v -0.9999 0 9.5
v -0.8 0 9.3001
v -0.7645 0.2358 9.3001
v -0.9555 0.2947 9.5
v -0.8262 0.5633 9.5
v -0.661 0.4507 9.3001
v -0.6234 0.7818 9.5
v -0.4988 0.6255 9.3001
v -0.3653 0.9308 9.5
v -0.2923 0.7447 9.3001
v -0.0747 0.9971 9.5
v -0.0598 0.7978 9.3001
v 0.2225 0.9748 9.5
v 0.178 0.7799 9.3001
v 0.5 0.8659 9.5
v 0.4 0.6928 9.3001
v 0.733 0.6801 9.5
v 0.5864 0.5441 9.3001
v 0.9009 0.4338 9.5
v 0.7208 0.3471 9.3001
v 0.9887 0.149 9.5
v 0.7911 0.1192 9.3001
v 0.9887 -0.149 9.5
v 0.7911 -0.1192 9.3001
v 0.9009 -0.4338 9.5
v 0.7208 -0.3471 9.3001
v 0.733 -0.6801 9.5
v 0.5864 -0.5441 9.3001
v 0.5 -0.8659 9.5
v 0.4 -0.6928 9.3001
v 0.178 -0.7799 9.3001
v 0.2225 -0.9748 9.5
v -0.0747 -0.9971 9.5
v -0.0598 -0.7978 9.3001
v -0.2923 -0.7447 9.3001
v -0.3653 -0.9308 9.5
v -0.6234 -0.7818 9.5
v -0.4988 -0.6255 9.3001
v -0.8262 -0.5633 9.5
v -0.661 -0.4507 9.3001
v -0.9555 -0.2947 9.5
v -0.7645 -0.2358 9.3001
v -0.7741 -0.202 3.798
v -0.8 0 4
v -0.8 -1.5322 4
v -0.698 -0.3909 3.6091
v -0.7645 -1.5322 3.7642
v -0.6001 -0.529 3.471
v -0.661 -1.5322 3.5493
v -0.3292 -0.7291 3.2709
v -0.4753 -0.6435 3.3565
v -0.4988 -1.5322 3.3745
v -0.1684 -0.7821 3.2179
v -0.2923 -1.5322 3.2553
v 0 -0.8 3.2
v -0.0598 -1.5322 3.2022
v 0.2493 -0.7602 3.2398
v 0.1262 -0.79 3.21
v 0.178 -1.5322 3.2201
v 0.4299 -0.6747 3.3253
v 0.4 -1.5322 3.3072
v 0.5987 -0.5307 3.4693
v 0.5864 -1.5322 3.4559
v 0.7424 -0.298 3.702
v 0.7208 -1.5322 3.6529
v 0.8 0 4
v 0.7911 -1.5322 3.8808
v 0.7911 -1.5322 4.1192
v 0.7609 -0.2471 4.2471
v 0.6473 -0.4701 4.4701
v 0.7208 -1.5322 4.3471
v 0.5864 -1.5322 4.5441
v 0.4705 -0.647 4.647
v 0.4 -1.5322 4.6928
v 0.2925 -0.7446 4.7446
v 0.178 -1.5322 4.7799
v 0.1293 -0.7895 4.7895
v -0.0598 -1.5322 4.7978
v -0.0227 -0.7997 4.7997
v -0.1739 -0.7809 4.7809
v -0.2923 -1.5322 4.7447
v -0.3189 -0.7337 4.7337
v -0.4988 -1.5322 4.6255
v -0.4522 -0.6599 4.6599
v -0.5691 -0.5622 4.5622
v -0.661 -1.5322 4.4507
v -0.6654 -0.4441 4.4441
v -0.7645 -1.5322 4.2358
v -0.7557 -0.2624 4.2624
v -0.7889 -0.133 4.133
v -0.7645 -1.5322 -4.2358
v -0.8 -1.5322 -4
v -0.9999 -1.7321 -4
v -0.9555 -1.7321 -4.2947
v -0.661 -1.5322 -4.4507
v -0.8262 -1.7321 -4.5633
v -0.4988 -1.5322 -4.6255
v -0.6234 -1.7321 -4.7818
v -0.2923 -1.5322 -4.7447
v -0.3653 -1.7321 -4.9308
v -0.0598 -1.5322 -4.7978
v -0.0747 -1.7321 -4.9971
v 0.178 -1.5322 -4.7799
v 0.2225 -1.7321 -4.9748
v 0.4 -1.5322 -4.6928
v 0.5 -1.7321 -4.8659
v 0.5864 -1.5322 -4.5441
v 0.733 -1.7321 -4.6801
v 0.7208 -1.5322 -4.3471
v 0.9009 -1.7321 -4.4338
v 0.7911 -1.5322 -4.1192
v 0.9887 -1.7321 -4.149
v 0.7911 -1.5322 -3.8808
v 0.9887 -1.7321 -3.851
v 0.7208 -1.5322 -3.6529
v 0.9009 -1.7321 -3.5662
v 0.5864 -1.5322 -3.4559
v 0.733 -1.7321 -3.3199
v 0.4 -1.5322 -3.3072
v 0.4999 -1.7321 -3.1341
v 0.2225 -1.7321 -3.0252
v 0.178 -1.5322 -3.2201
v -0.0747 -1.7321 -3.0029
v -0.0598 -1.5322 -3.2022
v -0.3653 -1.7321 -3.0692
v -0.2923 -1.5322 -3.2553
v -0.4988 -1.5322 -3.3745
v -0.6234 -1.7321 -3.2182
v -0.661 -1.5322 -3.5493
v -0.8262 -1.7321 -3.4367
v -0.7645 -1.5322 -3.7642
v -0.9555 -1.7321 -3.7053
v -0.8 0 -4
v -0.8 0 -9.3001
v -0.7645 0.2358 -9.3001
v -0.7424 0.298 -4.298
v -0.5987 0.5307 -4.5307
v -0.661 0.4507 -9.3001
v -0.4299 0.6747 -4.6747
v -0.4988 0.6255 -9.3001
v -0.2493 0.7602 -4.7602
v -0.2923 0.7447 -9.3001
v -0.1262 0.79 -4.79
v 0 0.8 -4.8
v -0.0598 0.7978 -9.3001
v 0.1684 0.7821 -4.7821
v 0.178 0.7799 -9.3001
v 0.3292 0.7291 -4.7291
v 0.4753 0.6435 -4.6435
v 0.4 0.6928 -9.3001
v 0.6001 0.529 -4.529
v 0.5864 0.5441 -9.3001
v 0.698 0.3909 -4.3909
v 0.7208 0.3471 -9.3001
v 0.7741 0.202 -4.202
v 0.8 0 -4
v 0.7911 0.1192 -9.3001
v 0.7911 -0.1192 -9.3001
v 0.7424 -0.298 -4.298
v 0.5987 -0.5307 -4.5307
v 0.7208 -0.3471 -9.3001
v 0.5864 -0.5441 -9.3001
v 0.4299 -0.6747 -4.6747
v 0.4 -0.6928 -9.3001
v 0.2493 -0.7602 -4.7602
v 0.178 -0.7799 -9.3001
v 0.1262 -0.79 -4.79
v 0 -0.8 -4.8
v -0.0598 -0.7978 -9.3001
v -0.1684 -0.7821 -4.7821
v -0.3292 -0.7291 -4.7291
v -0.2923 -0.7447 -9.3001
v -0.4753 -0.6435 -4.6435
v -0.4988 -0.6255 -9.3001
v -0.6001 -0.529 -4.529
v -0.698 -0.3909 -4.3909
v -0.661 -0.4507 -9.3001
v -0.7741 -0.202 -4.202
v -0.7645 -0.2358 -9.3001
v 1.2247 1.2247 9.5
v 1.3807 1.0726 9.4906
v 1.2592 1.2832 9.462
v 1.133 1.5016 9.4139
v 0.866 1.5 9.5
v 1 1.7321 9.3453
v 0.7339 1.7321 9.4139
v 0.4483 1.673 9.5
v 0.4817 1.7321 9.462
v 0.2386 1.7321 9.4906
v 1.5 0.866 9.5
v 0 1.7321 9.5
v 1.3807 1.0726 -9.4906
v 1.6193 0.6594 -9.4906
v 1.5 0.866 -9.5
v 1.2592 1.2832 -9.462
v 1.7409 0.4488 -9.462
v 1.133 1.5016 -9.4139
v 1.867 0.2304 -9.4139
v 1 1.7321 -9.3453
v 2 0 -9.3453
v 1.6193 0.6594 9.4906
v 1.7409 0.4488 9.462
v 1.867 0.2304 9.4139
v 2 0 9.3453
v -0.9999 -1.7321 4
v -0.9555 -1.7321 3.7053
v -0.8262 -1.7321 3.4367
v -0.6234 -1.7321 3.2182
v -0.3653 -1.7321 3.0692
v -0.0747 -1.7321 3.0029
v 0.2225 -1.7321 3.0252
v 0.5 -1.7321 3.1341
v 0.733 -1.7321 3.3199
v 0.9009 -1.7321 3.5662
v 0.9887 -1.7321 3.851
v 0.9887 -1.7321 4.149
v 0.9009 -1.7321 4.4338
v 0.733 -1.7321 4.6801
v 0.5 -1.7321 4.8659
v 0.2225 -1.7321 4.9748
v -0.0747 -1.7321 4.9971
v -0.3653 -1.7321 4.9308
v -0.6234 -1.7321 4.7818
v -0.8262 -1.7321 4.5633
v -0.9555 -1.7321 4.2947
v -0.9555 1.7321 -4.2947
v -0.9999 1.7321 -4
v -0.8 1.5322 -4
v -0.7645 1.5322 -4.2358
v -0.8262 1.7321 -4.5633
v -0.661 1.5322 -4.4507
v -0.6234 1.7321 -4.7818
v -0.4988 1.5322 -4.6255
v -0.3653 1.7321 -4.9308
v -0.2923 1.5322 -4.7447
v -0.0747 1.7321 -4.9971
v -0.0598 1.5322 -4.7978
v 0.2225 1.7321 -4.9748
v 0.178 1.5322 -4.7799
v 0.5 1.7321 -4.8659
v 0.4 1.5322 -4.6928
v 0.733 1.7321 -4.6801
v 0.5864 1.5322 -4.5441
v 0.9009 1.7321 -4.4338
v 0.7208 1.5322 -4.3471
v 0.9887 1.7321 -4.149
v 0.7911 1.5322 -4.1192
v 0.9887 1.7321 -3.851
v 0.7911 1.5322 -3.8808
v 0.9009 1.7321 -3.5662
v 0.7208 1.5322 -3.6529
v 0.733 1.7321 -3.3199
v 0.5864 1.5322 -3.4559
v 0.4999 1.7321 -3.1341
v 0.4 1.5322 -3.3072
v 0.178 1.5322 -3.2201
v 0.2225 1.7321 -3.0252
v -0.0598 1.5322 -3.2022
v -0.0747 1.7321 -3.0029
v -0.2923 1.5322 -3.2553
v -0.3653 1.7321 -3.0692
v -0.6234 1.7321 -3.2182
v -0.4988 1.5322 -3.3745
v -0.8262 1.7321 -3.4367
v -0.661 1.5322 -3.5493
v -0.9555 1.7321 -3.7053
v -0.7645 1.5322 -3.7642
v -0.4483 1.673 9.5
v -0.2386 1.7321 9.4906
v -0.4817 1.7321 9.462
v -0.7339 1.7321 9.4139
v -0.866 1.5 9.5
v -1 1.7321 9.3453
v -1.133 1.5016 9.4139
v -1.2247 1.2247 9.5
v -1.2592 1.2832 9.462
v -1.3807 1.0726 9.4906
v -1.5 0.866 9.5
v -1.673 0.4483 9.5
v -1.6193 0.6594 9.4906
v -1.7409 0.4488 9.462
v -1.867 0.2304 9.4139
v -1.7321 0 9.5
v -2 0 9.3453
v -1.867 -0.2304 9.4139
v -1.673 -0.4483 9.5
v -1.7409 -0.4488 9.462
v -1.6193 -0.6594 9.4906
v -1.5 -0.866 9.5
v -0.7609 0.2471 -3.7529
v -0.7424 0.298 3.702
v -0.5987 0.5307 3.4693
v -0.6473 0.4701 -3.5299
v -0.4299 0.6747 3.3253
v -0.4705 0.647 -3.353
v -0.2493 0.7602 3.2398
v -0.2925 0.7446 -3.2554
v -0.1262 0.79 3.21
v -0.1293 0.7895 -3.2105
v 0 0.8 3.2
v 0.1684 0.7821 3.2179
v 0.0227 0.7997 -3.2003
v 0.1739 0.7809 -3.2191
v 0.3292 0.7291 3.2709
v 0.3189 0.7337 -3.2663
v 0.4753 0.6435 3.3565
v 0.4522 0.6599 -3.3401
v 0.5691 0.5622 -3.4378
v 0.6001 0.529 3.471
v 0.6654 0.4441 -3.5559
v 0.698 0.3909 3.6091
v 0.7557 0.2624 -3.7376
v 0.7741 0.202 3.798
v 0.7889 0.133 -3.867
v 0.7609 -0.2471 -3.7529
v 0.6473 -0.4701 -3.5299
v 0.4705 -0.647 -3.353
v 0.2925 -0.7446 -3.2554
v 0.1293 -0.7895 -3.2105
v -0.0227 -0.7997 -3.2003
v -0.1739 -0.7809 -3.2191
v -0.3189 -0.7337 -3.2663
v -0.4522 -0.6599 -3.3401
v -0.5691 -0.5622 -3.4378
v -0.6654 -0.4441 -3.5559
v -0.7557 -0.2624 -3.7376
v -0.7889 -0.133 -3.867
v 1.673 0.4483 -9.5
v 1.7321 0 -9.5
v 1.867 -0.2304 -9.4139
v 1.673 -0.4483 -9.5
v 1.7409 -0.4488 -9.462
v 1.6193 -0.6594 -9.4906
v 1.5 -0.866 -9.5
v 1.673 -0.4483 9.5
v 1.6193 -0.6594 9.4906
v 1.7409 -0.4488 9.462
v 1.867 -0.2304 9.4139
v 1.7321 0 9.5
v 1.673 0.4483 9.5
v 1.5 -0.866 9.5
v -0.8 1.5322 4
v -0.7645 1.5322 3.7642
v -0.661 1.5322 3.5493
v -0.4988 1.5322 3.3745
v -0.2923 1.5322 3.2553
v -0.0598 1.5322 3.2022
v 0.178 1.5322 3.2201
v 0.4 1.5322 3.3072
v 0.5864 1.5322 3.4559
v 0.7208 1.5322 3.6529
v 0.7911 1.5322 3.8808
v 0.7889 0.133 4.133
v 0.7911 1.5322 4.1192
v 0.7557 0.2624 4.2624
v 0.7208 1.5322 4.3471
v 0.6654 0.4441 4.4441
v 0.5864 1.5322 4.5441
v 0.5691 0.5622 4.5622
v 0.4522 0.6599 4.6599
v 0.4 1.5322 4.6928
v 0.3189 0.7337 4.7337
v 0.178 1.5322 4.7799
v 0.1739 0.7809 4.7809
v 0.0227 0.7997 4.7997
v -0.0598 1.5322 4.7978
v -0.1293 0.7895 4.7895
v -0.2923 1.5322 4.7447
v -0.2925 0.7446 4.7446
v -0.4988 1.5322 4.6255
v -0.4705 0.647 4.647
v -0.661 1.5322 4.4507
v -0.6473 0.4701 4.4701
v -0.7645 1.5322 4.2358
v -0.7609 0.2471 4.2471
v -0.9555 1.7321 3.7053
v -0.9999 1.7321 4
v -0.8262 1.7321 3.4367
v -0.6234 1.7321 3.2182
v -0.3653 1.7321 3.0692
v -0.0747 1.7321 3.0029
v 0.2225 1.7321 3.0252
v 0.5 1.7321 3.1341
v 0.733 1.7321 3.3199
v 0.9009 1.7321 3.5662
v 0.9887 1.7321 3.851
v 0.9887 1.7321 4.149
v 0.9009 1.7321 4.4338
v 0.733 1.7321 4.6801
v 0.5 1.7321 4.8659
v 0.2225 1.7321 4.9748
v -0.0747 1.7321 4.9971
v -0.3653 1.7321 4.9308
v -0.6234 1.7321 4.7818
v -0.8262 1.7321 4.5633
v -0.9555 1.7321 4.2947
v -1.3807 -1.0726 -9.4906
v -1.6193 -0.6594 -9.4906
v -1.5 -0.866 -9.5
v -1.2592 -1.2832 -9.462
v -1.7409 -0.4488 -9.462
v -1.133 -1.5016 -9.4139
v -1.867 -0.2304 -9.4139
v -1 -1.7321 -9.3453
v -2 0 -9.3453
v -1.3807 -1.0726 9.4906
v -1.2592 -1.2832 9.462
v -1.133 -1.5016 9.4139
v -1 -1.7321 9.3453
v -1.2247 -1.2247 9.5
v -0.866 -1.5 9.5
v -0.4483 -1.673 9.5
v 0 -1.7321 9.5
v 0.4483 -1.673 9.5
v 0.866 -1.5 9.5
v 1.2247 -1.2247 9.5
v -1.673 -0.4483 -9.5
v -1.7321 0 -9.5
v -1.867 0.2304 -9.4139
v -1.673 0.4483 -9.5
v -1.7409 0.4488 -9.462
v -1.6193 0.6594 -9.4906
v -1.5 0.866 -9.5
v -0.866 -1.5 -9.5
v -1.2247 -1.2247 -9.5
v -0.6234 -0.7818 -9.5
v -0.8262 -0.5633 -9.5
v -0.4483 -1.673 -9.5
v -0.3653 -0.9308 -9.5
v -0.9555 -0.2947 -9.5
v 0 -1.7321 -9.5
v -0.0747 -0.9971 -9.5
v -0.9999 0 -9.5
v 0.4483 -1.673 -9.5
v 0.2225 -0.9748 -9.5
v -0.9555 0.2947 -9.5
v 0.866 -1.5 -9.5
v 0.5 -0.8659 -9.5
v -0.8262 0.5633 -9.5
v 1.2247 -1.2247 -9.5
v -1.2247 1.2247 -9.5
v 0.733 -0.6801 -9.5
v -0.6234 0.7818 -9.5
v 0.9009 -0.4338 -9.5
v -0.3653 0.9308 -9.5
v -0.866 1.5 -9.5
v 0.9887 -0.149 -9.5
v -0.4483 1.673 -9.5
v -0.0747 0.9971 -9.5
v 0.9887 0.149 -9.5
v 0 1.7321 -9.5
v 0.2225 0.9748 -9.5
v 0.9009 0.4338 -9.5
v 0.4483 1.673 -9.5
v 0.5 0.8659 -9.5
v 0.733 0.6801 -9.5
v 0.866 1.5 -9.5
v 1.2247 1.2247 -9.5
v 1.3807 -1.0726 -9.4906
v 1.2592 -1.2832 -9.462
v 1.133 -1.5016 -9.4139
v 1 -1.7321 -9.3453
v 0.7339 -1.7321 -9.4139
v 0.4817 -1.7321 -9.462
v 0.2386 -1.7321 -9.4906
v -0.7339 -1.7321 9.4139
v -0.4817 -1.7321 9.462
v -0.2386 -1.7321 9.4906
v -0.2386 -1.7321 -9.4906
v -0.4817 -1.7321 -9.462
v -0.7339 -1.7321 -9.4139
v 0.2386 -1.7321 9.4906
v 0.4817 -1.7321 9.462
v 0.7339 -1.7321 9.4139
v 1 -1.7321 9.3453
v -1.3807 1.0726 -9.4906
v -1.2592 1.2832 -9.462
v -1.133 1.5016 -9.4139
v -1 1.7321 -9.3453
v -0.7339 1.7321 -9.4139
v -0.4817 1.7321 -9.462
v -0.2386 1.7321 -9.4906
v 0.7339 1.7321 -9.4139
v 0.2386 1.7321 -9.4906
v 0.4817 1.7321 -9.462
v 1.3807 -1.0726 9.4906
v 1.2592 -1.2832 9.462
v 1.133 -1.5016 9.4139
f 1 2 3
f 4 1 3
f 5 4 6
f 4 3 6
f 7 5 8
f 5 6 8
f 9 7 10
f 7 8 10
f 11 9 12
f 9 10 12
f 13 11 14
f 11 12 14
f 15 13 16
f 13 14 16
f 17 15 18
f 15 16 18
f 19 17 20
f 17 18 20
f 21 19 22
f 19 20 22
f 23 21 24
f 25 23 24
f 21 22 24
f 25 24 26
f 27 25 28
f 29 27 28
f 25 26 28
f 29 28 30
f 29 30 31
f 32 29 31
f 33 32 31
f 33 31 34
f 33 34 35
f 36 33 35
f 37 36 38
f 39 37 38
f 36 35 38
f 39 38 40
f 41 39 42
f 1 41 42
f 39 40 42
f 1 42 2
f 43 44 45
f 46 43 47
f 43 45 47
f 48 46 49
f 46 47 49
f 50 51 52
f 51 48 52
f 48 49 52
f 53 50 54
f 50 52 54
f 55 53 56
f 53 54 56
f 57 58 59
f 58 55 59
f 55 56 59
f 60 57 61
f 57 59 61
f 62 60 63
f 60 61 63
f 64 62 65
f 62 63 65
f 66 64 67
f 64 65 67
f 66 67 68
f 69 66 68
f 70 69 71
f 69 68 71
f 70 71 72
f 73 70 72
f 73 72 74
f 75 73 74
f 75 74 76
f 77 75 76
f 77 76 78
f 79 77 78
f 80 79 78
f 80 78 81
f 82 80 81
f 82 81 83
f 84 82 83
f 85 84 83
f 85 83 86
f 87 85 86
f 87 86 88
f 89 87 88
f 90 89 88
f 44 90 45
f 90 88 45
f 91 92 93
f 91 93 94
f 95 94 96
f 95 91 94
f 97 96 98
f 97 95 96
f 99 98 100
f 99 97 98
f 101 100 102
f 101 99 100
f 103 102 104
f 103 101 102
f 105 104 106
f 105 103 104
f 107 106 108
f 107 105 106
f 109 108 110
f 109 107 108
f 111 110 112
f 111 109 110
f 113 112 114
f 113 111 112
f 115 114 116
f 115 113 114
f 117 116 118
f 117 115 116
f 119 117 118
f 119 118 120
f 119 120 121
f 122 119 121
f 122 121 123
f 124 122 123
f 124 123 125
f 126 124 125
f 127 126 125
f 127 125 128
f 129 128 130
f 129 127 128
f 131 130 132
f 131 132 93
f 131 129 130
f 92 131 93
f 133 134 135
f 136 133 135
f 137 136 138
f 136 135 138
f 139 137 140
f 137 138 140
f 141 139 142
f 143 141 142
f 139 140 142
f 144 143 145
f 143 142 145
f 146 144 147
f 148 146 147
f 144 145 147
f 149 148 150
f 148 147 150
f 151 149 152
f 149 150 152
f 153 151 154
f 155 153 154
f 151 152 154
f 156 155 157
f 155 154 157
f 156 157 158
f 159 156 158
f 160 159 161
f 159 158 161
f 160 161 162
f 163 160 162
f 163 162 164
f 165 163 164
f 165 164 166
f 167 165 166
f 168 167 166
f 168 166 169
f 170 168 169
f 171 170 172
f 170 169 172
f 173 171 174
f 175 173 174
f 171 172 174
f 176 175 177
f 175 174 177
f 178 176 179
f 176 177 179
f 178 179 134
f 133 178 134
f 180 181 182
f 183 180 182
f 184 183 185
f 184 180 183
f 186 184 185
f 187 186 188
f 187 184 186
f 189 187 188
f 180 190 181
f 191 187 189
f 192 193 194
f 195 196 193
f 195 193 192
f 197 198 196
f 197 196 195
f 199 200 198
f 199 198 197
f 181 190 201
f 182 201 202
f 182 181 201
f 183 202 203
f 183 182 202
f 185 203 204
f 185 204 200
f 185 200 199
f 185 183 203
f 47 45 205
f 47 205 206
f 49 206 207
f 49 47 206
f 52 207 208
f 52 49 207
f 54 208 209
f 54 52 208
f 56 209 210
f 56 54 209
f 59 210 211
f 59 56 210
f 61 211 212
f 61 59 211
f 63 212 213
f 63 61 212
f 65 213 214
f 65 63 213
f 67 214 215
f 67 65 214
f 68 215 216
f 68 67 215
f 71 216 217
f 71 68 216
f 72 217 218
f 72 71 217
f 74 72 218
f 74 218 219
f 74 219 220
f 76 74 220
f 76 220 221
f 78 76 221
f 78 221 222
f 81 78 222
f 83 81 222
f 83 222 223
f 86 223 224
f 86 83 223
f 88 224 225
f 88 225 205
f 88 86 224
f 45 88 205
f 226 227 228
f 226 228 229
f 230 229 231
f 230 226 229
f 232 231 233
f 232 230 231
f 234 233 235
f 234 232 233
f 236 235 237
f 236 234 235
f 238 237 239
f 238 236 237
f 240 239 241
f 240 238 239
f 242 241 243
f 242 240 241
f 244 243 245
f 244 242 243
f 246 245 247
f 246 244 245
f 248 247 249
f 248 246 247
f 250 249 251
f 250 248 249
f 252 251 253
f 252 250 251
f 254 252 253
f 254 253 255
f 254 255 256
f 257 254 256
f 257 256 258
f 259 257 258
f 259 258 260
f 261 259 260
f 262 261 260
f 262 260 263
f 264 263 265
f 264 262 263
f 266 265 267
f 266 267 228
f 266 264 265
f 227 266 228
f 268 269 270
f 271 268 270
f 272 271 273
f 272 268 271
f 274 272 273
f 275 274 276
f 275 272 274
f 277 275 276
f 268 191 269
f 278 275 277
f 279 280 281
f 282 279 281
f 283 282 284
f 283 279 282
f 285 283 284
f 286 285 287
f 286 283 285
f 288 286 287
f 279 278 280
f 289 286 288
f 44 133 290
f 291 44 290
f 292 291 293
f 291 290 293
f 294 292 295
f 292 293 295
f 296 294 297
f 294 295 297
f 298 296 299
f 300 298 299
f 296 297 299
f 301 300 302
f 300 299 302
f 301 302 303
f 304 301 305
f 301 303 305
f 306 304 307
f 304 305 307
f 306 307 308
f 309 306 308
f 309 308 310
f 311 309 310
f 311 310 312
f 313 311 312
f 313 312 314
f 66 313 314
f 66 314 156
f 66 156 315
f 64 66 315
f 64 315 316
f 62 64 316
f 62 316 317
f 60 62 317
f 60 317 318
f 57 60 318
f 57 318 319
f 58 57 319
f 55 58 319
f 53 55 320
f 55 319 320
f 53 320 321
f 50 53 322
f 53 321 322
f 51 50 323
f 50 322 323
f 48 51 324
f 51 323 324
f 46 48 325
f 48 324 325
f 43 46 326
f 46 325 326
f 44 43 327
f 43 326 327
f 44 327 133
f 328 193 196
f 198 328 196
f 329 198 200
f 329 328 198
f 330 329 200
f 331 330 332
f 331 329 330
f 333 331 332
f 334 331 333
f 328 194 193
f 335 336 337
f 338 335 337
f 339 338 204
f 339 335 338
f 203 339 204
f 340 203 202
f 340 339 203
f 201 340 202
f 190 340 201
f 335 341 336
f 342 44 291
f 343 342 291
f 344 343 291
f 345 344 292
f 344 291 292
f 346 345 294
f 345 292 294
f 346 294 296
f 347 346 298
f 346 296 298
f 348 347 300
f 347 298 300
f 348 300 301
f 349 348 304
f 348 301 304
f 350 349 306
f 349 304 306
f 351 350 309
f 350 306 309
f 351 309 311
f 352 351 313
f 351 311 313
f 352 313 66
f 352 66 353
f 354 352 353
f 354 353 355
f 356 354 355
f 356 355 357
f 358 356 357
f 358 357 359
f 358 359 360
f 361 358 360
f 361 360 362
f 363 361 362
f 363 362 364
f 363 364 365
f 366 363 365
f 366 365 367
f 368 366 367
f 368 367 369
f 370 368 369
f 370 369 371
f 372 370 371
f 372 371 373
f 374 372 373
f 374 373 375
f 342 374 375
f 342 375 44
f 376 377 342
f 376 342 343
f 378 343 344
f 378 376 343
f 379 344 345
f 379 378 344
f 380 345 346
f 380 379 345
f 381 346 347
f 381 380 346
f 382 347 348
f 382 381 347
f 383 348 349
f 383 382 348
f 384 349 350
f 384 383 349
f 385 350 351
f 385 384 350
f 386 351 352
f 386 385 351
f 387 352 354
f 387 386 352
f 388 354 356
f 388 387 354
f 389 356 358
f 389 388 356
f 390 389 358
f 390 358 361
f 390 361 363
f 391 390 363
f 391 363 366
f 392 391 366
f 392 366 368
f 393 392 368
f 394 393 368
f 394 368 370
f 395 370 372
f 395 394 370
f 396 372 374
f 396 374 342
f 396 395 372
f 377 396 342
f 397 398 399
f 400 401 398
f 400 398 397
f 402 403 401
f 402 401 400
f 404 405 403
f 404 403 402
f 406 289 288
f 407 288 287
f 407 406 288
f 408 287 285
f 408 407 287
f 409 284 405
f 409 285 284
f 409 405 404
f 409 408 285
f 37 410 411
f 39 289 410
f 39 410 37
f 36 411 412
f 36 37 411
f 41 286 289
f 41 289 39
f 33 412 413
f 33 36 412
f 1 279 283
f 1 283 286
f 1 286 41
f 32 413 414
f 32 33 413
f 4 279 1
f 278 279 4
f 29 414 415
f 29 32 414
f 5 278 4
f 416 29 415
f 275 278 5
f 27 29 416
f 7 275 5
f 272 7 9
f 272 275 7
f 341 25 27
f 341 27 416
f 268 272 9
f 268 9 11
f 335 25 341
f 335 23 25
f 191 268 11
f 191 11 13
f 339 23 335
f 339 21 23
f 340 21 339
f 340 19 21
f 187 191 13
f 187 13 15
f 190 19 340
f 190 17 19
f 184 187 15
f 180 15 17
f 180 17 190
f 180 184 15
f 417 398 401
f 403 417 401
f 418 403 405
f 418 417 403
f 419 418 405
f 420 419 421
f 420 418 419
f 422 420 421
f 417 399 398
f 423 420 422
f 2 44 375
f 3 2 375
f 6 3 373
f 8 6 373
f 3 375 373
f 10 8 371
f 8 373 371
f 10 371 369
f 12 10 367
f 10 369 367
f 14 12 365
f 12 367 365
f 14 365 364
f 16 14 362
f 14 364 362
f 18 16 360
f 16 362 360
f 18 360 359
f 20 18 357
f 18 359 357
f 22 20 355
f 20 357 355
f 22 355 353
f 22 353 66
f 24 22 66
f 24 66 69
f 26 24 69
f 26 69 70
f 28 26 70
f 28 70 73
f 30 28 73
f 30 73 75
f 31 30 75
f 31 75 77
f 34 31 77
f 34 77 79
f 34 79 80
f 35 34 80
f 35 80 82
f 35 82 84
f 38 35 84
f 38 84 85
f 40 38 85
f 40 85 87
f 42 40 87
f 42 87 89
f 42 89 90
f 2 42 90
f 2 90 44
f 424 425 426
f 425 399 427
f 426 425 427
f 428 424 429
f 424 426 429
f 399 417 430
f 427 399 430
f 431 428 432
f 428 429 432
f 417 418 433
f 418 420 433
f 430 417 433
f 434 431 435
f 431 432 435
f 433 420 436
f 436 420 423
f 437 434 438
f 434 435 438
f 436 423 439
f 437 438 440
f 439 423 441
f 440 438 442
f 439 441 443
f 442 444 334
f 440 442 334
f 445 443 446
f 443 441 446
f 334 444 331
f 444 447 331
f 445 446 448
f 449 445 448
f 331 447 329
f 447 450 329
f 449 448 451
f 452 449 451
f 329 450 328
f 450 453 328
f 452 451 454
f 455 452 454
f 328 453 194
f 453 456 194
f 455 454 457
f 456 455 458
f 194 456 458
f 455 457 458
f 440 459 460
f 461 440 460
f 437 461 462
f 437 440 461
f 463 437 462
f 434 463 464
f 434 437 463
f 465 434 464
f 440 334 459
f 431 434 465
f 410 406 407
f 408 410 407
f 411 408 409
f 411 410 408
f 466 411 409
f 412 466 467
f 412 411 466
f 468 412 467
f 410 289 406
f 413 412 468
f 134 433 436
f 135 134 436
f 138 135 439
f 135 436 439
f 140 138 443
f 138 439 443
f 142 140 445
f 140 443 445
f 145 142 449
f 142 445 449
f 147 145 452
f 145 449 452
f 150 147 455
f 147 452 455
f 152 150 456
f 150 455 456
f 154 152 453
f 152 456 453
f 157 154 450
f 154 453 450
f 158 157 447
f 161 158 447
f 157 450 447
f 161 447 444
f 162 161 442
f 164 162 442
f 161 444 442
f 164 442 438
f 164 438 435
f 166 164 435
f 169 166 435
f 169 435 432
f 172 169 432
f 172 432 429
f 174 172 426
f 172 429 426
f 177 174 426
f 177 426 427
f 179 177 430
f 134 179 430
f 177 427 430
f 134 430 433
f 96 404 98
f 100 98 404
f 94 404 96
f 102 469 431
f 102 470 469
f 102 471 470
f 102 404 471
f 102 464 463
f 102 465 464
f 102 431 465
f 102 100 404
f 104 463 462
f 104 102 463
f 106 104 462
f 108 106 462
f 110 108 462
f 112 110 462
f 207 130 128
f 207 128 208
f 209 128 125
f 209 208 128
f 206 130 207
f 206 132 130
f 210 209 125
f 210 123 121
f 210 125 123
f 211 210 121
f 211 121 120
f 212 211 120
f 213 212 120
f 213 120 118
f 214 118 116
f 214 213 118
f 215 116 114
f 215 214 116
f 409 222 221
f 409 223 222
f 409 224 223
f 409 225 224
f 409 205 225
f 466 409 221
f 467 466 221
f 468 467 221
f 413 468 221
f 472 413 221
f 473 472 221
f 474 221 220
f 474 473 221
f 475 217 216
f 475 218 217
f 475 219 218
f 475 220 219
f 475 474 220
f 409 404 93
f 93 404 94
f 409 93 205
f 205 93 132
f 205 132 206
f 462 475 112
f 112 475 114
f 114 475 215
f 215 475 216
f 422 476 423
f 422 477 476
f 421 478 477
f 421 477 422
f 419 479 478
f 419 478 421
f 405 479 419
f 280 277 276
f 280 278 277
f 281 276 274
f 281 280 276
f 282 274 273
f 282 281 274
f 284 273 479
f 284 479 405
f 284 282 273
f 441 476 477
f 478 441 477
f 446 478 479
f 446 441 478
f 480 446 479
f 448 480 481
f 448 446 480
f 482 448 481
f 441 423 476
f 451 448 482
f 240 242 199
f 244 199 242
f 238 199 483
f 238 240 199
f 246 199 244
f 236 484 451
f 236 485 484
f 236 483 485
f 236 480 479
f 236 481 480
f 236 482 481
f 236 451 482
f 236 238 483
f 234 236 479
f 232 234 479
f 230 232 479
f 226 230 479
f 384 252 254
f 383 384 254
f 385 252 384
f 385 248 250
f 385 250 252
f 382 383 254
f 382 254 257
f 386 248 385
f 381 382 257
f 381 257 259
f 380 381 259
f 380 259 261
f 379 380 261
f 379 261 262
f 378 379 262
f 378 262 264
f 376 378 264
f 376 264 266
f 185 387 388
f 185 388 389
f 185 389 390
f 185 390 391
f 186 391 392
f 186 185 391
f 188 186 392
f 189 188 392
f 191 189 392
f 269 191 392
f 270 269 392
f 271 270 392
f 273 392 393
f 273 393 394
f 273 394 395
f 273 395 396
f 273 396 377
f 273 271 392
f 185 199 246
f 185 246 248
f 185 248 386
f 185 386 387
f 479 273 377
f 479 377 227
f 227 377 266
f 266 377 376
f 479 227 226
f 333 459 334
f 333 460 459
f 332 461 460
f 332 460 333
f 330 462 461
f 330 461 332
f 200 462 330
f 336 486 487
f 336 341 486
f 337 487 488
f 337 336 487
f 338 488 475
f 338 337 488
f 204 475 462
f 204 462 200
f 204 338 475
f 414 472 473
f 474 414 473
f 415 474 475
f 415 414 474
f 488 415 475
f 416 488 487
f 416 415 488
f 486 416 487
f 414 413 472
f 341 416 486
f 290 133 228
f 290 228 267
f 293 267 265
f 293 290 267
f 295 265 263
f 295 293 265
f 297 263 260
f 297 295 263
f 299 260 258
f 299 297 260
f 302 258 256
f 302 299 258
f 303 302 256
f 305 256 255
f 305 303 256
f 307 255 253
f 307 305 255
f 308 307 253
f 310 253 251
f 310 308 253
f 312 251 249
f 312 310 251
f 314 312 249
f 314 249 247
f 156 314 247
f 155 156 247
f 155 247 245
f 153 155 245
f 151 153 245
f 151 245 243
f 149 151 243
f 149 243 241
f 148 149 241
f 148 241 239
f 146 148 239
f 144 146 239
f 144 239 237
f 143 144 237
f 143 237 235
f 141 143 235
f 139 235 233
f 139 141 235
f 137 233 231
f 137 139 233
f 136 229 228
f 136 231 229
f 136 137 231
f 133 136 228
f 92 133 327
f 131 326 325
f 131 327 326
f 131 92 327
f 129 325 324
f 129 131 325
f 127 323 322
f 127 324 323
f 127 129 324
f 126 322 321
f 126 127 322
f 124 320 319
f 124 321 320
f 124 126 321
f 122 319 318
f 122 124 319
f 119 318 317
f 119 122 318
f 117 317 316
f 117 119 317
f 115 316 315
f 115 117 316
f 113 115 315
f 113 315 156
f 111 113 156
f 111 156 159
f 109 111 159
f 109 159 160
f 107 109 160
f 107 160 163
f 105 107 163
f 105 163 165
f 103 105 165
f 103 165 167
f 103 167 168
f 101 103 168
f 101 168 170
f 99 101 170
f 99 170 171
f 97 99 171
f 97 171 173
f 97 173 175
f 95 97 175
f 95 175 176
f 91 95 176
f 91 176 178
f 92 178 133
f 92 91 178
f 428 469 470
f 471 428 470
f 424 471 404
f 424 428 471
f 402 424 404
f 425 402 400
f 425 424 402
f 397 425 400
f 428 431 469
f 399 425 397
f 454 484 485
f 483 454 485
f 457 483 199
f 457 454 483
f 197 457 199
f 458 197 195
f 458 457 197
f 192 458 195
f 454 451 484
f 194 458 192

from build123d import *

# Parameters (mm, degrees)
EXTRUDE_1_DEPTH          = 9.5
SKETCH_2_OUTSIDE_W       = 79.862
SKETCH_2_OUTSIDE_H       = 79.326
SKETCH_2_OUTSIDE_R       = 1.732050808
CUT_EXTRUDE_1_DEPTH      = 20.183326093
CUT_EXTRUDE_1_DRAFT      = -60
HOLE_WIZARD_M2_1_D       = 1.6
HOLE_WIZARD_M2_2_D       = 1.6
MIRROR_1_COPY_1_SKETCH_W = 79.862
MIRROR_1_COPY_1_SKETCH_H = 79.326
MIRROR_1_COPY_1_SKETCH_R = 1.732050808
MIRROR_1_COPY_1_DEPTH    = 20.183326093
MIRROR_1_COPY_1_DRAFT    = -60
CHAMFER_1_SIZE           = 0.2


with BuildPart() as part:
    # 草图1 → 凸台-拉伸1 (new, symmetric)
    with BuildSketch(Plane.XY):
        Polygon((2, 0), (1, 1.732050808), (-1, 1.732050808), (-2, 0), (-1, -1.732050808), (1, -1.732050808), align=None)
    extrude(amount=EXTRUDE_1_DEPTH, both=True)


with BuildPart() as cut_extrude_1_tool:
    # 草图2 outside → 切除-拉伸1 (with draft: the straight prism first)
    with BuildSketch(Plane.XY.offset(9.5)):
        Rectangle(SKETCH_2_OUTSIDE_W, SKETCH_2_OUTSIDE_H)
        Circle(SKETCH_2_OUTSIDE_R, mode=Mode.SUBTRACT)
    extrude(amount=-CUT_EXTRUDE_1_DEPTH)
    # 切除-拉伸1: the draft: its side faces are tilted about the plane it starts from
    cut_extrude_1_sides = [cut_extrude_1_tool.faces().sort_by_distance(p)[0] for p in [
        (0, -39.663, -0.591663047),
        (39.931, 0, -0.591663047),
        (0, 39.663, -0.591663047),
        (-39.931, 0, -0.591663047),
        (-1.732050808, 0, -0.591663047),
    ]]
    draft(cut_extrude_1_sides, Plane.XY.offset(9.5), CUT_EXTRUDE_1_DRAFT)


with BuildPart() as part_1:
    add(part.part)

    # 切除-拉伸1: cut by cut_extrude_1_tool
    add(cut_extrude_1_tool.part, mode=Mode.SUBTRACT)

    # M2 螺纹孔1 (through all)
    with Locations(Plane.XY.offset(9.5)):
        with Locations((0, 0)):
            hole_wizard_m2_1 = Hole(HOLE_WIZARD_M2_1_D / 2)

    # M2 螺纹孔2 (through all)
    with Locations(Plane(origin=(0, 1.732050808, 0), x_dir=(1, 0, 0), z_dir=(0, 1, 0))):
        with Locations((0, -4)):
            hole_wizard_m2_2 = Hole(HOLE_WIZARD_M2_2_D / 2)

    # 镜向1: M2 螺纹孔1, M2 螺纹孔2 across plane
    add(hole_wizard_m2_1.mirror(Plane.XY), mode=Mode.SUBTRACT)
    add(hole_wizard_m2_2.mirror(Plane.XY), mode=Mode.SUBTRACT)


with BuildPart() as mirror_1_copy_1_tool:
    # 镜向1 copy 1 sketch → 镜向1 copy 1 (with draft: the straight prism first)
    with BuildSketch(Plane(origin=(0, 0, -9.5), x_dir=(1, 0, 0), z_dir=(0, 0, -1))):
        Rectangle(MIRROR_1_COPY_1_SKETCH_W, MIRROR_1_COPY_1_SKETCH_H)
        Circle(MIRROR_1_COPY_1_SKETCH_R, mode=Mode.SUBTRACT)
    extrude(amount=-MIRROR_1_COPY_1_DEPTH)
    # 镜向1 copy 1: the draft: its side faces are tilted about the plane it starts from
    mirror_1_copy_1_sides = [mirror_1_copy_1_tool.faces().sort_by_distance(p)[0] for p in [
        (0, -39.663, 0.591663047),
        (39.931, 0, 0.591663047),
        (0, 39.663, 0.591663047),
        (-39.931, 0, 0.591663047),
        (-1.732050808, 0, 0.591663047),
    ]]
    draft(mirror_1_copy_1_sides, Plane(origin=(0, 0, -9.5), x_dir=(1, 0, 0), z_dir=(0, 0, -1)), MIRROR_1_COPY_1_DRAFT)


with BuildPart() as part_2:
    add(part_1.part)

    # 镜向1 copy 1: cut by mirror_1_copy_1_tool
    add(mirror_1_copy_1_tool.part, mode=Mode.SUBTRACT)

    # 倒角1
    chamfer_1_edges = [part_2.edges().sort_by_distance(p)[0] for p in [
        (0.8, -1.732050808, -4),
        (0.8, 1.732050808, -4),
        (0.8, 0, 9.5),
        (0.8, 0, -9.5),
        (0.8, -1.732050808, 4),
        (0.8, 1.732050808, 4),
    ]]
    chamfer(chamfer_1_edges, length=CHAMFER_1_SIZE - 0.0001)  # a hair under: the kernel refuses the full size


solid = part_2.part
